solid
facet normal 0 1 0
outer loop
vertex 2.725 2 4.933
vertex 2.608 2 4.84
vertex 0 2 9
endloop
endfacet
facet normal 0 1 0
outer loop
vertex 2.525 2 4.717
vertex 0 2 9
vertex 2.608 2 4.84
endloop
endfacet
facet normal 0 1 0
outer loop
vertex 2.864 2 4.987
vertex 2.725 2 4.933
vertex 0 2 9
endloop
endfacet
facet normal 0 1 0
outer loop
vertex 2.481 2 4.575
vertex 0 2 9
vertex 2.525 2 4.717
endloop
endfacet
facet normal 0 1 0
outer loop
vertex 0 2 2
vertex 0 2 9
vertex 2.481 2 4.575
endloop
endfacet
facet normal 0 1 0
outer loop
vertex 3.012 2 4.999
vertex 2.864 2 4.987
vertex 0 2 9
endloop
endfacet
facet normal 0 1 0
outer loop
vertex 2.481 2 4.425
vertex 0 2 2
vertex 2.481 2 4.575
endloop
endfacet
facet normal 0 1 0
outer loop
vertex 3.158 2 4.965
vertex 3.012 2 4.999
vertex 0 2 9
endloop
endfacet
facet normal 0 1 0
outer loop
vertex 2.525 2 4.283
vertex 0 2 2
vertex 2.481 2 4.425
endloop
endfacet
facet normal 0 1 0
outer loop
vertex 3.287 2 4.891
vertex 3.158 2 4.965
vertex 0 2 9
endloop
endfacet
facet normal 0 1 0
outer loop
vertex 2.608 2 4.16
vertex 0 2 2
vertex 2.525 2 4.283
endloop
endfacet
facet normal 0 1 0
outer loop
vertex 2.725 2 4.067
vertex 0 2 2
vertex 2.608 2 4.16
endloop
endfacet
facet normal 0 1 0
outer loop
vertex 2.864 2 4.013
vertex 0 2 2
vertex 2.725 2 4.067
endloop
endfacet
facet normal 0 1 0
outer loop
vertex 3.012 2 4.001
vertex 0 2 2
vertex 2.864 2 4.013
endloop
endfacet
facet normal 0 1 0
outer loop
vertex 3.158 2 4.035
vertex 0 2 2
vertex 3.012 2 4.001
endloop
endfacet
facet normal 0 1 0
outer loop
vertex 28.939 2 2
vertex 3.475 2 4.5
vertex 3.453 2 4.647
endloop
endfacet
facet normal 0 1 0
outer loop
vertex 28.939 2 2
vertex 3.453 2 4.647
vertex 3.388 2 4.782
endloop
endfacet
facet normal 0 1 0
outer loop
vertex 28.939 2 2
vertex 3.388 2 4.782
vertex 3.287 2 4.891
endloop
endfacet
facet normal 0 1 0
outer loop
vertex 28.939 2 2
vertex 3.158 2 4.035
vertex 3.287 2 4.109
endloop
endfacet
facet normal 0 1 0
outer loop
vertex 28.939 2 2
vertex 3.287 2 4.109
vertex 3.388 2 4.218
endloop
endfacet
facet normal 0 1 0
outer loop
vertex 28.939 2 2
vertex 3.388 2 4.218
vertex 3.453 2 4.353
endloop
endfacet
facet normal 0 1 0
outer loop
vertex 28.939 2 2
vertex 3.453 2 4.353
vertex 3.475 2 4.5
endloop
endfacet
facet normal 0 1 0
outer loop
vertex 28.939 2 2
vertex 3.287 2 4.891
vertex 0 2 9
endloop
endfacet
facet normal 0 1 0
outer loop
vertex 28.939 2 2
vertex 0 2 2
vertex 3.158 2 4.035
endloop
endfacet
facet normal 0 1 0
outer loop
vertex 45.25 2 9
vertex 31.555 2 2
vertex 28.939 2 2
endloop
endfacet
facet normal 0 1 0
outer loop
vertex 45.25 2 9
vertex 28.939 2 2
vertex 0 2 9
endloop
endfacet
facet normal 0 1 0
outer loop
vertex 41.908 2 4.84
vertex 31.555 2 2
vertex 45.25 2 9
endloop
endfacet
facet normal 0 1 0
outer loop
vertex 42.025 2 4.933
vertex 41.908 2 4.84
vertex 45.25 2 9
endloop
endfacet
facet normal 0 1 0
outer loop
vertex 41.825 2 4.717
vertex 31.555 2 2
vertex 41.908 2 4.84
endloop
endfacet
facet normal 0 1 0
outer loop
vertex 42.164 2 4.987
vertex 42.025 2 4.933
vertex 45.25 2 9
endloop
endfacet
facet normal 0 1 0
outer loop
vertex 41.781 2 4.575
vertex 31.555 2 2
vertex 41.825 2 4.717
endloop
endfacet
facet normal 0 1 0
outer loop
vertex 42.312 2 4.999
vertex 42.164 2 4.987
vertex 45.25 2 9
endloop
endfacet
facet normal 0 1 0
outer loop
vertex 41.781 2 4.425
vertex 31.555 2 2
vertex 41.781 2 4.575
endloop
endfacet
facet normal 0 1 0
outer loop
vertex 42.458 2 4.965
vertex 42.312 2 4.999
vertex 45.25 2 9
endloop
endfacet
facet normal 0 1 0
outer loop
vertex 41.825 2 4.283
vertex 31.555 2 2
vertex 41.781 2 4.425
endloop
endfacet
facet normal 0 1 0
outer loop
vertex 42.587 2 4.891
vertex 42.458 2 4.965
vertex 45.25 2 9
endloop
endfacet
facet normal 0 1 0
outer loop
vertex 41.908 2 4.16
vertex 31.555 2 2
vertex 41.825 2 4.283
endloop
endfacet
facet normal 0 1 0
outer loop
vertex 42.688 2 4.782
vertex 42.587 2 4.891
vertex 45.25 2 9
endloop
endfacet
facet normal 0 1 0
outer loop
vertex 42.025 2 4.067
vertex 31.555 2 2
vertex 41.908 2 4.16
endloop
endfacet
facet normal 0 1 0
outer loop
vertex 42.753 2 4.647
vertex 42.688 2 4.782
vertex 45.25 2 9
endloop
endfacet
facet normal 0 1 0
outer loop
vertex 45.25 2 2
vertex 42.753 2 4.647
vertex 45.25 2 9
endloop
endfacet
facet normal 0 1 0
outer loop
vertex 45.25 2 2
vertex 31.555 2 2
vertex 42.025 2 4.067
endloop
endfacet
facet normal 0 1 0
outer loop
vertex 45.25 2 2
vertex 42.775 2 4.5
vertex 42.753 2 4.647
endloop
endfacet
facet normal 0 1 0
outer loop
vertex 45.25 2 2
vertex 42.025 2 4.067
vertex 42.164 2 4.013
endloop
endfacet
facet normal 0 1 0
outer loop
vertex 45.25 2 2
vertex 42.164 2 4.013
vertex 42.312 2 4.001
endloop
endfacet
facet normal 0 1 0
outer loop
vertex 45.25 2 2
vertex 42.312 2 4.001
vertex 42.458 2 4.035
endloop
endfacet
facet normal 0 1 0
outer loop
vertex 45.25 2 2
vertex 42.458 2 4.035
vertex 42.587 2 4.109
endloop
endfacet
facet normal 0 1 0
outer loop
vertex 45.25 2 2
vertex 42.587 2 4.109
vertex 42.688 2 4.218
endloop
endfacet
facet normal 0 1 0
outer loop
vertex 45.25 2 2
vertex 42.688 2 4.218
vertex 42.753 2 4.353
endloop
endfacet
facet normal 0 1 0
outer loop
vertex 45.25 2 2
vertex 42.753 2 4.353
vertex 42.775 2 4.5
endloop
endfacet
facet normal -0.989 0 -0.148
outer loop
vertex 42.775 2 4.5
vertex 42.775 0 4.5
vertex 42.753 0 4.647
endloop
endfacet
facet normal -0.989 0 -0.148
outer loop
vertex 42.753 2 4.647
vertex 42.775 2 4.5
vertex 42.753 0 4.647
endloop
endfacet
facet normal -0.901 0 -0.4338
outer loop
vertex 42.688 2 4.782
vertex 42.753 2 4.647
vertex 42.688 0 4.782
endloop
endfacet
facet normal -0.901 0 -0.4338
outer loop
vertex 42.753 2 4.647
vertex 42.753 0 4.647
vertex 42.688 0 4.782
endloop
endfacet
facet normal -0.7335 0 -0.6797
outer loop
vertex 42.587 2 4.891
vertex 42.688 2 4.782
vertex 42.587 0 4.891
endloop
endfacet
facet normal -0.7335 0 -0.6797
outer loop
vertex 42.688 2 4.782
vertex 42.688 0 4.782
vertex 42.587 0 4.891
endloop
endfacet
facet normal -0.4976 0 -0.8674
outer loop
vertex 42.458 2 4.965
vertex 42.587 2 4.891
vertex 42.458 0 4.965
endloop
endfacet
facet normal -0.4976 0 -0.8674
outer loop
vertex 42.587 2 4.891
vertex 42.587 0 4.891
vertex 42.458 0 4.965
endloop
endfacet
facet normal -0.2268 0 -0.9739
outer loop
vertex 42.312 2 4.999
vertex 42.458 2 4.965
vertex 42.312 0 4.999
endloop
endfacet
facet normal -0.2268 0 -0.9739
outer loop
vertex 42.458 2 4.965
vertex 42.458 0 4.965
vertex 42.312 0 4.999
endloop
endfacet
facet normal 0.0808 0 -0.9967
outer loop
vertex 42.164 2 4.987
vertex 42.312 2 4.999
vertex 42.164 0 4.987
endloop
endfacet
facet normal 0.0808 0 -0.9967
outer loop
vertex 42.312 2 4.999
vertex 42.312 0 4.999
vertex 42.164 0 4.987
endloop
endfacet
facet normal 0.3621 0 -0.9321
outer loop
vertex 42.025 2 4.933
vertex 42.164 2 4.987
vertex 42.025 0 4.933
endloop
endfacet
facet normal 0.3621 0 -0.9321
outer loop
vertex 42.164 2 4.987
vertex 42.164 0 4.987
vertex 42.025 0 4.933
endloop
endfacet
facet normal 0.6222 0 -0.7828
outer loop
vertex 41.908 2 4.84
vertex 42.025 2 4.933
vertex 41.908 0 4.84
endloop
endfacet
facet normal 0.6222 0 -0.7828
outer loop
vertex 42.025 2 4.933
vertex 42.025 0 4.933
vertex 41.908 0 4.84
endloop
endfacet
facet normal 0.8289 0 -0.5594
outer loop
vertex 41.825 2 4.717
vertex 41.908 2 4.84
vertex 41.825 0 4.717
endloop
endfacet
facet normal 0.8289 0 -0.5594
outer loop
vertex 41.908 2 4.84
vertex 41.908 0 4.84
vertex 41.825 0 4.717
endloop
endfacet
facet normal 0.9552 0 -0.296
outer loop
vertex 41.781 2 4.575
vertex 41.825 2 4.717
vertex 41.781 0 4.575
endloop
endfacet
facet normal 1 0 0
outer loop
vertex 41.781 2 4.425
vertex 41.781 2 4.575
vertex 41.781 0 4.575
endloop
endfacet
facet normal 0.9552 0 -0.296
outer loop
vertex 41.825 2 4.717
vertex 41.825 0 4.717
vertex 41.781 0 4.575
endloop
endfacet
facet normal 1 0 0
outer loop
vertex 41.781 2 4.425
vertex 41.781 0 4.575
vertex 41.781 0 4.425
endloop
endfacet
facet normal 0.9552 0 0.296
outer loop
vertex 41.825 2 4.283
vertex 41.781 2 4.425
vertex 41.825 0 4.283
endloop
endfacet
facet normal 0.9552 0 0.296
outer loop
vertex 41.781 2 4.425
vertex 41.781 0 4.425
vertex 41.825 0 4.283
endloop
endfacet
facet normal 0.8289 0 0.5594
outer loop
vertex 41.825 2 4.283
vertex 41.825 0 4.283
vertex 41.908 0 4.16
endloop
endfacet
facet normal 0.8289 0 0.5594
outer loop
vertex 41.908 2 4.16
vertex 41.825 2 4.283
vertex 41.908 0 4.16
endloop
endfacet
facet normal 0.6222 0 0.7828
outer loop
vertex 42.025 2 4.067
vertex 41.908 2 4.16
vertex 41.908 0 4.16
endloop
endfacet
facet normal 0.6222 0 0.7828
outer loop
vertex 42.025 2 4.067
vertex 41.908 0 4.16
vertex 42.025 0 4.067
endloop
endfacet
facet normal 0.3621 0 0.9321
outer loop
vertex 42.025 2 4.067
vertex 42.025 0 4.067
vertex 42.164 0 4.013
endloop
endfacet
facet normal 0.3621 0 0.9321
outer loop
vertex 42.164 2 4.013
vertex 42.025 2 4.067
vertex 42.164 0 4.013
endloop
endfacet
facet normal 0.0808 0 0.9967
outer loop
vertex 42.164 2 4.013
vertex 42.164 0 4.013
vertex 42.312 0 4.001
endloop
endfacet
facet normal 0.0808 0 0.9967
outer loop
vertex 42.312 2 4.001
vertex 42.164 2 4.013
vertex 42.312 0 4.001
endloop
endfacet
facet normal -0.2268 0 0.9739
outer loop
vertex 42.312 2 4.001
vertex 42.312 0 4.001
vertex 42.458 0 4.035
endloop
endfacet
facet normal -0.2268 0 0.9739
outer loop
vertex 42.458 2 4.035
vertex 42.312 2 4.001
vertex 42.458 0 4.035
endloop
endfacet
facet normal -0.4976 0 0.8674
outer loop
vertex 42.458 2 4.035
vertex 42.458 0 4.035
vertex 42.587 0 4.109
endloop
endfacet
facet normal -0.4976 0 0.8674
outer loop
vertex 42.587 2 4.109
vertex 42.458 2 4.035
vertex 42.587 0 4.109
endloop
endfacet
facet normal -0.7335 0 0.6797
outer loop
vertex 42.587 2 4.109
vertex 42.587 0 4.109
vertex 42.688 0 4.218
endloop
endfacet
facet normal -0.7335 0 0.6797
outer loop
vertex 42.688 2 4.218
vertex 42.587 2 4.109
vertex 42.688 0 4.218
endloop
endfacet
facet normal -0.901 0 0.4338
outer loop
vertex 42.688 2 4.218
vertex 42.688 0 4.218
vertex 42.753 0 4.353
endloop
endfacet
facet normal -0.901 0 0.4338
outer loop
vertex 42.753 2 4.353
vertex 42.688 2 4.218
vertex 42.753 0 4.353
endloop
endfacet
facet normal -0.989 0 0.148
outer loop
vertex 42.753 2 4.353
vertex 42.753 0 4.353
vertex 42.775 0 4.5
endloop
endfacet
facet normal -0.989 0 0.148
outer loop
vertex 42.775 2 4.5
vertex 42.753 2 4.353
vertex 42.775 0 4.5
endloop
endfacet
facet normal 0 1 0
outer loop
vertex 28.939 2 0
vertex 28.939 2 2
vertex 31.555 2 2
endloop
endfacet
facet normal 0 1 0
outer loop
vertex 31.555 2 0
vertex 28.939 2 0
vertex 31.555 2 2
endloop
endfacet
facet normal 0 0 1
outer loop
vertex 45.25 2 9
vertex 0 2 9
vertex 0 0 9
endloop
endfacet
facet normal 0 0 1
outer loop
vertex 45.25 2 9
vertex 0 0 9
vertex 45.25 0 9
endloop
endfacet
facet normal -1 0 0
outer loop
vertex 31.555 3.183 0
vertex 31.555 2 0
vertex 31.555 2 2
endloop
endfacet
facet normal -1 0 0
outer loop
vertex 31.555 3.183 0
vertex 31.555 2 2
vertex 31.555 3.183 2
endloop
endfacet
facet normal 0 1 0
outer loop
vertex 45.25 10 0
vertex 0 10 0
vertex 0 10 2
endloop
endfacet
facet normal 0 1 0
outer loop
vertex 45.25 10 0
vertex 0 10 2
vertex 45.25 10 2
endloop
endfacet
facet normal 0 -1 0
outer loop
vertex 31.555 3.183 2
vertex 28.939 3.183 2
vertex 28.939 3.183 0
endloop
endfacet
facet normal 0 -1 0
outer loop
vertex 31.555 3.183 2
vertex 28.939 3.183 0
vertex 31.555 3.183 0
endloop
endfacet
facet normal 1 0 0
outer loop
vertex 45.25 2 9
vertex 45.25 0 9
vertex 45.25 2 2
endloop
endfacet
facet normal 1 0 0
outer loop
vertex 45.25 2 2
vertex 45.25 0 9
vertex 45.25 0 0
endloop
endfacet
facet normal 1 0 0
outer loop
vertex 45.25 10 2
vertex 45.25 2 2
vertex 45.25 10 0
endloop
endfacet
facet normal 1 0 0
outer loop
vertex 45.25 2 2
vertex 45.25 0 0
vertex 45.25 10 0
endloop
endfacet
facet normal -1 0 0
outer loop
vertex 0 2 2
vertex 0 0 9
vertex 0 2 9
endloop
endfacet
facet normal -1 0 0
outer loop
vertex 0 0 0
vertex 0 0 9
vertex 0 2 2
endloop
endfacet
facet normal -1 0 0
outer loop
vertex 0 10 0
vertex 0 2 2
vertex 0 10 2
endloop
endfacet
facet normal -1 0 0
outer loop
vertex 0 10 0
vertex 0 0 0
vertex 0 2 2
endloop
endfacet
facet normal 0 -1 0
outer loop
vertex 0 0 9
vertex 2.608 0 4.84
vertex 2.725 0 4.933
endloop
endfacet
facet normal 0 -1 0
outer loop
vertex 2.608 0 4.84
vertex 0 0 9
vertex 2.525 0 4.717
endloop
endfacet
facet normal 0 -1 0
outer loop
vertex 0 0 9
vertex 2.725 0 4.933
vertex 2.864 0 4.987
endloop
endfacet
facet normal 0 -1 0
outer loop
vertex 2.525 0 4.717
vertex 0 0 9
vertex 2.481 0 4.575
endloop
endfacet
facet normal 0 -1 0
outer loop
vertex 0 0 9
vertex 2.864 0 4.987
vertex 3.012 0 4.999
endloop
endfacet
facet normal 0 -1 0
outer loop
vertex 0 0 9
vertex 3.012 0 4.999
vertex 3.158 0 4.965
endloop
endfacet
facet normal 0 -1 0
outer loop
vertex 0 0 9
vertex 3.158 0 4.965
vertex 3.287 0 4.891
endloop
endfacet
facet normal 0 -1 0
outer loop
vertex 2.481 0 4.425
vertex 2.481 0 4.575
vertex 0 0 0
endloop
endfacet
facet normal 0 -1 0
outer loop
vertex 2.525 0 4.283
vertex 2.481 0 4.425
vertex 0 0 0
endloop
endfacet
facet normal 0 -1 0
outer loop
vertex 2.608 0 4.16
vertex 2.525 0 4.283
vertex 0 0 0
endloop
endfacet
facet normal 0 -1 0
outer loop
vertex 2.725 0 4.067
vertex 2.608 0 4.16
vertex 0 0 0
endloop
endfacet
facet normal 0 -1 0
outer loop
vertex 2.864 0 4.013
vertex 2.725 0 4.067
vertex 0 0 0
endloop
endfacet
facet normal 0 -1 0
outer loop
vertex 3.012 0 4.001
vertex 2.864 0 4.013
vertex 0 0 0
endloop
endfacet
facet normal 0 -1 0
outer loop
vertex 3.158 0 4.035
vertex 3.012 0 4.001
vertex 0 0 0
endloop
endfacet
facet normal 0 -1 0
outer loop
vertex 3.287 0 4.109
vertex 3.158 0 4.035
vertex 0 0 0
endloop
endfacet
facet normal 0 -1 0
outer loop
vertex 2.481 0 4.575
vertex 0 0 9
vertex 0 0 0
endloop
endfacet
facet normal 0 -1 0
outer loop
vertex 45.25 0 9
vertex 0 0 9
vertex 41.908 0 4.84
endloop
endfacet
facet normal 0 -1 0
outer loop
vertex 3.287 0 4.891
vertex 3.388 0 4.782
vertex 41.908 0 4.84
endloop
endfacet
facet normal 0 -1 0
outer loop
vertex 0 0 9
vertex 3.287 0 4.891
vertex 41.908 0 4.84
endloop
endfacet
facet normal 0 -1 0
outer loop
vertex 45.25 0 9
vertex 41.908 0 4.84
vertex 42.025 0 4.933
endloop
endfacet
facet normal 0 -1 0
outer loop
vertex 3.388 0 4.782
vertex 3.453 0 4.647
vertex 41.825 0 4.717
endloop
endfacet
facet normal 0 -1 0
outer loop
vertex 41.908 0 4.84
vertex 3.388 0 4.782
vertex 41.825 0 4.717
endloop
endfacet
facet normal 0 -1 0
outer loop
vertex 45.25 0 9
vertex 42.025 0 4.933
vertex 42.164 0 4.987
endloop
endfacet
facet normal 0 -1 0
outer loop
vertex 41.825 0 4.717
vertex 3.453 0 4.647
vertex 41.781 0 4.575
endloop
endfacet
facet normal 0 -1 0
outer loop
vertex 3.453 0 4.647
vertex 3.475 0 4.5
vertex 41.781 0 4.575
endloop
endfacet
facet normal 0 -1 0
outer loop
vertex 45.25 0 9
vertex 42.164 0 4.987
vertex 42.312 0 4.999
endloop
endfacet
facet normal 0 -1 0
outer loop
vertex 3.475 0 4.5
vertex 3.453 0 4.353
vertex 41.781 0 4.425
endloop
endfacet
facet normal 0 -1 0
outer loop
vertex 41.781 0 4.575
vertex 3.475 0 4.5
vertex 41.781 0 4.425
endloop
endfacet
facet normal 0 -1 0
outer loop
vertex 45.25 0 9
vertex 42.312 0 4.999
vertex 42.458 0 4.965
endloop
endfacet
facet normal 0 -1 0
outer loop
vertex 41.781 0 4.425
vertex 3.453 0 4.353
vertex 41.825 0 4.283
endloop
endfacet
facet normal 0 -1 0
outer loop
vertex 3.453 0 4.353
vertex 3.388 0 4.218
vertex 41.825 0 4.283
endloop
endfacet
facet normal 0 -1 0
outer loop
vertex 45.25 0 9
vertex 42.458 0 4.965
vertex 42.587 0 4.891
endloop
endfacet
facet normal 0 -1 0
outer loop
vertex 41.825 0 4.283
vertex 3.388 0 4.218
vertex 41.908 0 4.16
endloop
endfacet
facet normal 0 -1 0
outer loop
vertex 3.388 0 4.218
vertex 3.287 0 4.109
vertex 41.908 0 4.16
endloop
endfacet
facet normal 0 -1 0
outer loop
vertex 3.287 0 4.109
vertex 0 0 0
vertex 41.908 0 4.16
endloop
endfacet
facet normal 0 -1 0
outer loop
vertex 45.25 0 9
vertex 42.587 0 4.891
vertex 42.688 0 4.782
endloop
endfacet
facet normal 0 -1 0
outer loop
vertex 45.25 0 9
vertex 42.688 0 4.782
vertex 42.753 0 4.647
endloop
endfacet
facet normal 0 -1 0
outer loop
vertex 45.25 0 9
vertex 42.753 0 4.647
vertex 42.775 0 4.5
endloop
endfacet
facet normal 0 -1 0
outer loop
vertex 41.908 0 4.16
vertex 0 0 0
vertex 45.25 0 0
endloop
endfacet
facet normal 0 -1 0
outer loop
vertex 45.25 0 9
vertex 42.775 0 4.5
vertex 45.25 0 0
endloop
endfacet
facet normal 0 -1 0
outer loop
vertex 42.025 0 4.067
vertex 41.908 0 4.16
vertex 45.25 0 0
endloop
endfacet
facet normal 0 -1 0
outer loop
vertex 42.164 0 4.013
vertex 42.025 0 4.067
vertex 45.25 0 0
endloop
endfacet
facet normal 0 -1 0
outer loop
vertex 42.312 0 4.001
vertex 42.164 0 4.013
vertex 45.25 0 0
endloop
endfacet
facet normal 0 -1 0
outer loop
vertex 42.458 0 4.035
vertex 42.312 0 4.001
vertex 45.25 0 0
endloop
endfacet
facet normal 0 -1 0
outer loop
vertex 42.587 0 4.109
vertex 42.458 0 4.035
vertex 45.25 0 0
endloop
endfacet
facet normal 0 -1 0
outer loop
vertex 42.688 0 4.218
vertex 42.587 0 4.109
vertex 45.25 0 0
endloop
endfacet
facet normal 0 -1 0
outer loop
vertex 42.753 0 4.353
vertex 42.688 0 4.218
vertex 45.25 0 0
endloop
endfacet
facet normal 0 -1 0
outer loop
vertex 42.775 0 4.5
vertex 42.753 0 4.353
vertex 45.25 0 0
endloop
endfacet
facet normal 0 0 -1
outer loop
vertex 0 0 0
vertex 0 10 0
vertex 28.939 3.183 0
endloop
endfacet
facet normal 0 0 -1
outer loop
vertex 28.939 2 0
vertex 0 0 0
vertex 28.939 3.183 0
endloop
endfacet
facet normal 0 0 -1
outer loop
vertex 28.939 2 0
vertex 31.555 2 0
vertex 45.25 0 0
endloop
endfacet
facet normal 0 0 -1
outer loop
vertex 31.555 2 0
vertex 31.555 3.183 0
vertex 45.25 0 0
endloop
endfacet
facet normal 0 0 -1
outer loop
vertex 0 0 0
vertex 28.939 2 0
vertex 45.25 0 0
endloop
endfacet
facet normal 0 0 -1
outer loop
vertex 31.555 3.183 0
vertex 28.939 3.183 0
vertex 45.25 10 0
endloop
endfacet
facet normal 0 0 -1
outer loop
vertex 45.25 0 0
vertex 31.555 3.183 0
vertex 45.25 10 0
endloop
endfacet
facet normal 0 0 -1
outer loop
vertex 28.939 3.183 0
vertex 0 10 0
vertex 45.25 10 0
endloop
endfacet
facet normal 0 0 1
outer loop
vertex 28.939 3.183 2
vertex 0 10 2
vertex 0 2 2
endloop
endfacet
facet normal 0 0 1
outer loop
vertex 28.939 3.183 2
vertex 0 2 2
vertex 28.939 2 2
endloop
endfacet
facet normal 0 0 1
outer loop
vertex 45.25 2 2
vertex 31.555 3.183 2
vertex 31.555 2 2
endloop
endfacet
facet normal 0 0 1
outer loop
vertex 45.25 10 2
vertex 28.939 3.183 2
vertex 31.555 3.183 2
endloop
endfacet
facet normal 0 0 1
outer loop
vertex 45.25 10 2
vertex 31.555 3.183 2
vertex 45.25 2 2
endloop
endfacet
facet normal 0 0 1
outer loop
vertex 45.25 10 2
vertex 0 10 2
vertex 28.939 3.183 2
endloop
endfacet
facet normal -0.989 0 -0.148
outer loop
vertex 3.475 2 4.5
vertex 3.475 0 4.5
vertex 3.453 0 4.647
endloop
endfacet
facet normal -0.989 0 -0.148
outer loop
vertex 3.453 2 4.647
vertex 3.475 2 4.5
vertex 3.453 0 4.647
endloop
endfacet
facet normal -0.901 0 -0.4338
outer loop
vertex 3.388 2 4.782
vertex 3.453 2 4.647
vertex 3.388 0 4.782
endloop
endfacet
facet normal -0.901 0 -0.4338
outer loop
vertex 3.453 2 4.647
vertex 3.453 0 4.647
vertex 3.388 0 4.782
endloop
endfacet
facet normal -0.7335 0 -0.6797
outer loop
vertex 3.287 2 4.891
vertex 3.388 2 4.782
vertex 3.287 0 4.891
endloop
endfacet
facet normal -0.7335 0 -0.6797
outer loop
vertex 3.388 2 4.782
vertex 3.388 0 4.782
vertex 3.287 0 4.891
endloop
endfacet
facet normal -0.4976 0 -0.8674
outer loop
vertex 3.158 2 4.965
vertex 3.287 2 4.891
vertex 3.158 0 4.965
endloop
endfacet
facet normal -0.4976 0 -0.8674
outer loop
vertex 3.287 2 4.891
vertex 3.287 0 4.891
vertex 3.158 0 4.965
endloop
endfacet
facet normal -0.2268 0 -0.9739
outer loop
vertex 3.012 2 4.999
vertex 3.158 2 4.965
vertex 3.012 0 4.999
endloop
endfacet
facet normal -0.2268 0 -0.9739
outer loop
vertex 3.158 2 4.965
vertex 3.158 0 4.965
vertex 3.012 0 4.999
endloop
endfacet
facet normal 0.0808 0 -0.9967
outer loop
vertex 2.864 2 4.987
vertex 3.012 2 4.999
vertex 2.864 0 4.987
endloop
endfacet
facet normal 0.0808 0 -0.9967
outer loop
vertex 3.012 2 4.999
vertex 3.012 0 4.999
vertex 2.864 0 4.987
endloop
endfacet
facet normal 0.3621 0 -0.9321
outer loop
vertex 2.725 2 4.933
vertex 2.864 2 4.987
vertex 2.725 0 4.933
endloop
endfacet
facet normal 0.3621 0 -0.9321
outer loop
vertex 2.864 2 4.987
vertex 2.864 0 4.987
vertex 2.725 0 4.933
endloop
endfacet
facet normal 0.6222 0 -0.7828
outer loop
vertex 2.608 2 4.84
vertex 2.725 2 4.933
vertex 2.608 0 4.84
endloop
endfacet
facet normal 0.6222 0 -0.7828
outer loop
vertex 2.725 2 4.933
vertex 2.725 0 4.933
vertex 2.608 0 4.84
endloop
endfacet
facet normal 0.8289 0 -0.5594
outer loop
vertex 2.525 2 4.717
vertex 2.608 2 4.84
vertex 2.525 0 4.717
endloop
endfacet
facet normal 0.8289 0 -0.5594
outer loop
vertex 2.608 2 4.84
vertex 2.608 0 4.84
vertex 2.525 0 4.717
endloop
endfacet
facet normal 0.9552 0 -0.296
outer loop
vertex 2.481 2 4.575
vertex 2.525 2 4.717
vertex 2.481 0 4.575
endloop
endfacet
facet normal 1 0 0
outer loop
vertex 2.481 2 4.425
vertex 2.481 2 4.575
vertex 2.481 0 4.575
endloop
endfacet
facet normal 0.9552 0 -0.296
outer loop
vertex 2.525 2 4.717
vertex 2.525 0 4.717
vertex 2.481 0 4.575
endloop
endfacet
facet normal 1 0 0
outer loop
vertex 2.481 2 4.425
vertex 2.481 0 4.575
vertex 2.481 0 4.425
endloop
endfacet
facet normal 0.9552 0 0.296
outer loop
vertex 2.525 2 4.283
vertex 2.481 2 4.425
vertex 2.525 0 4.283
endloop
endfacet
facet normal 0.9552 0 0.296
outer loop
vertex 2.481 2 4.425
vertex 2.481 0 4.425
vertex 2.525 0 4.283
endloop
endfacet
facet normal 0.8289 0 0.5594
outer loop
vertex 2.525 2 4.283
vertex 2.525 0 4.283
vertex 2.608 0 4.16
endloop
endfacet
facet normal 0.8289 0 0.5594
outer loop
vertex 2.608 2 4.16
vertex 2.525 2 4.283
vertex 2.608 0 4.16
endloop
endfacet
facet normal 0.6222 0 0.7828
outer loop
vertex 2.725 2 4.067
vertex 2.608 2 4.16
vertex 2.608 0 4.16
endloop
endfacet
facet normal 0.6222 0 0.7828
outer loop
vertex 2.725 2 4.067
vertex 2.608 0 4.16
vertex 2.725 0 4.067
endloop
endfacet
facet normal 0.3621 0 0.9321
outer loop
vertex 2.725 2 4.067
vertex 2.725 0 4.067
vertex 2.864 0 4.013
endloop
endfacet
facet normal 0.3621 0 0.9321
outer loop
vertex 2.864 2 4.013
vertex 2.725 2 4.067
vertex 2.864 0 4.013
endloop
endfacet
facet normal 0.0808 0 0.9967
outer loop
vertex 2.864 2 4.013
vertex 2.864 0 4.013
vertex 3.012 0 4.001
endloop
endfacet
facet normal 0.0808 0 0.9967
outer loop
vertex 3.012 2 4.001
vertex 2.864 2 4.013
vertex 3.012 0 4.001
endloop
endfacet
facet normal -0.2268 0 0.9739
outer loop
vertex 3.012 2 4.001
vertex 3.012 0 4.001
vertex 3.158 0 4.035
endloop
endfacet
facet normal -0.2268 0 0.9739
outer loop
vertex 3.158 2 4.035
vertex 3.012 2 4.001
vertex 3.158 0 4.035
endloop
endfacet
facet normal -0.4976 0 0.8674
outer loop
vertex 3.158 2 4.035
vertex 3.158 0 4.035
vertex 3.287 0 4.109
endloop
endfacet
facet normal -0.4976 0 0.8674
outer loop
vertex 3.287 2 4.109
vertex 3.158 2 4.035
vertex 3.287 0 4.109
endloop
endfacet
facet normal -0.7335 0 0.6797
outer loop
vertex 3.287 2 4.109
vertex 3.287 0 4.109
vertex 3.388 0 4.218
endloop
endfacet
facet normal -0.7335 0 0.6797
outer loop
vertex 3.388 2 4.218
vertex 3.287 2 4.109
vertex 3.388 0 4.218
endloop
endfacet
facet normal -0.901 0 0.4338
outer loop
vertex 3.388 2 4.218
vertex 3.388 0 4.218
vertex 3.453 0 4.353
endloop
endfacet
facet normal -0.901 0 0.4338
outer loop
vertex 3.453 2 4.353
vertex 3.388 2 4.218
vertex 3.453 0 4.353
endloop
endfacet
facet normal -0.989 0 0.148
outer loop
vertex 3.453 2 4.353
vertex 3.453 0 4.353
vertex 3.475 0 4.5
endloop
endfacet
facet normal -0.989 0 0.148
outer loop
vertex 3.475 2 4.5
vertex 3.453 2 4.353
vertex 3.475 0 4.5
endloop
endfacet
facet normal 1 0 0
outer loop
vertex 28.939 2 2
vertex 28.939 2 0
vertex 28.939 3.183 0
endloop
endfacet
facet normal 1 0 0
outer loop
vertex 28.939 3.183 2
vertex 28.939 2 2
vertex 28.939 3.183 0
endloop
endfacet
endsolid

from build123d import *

# Parameters (mm, degrees)
F0_W     = 45.25
F0_H     = 10
F1_DEPTH = 2
F2_W     = 45.25
F2_H     = 2
F3_DEPTH = 7
F4_R     = 0.5
F5_DEPTH = 25
F6_DEPTH = 25
F7_W     = 2.616208
F7_H     = 1.183311
F8_DEPTH = 3


with BuildPart() as f1:
    # F0 (on Top) → F1 (new body)
    with BuildSketch(Plane.XY):
        with Locations((22.625, 5)):
            Rectangle(F0_W, F0_H)
    extrude(amount=F1_DEPTH)

    # F2 (on face) → F3 (join)
    with BuildSketch(Plane.XY.offset(2)):
        with Locations((22.625, 1)):
            Rectangle(F2_W, F2_H)
    extrude(amount=F3_DEPTH)

    # F4 (on face) → F5 (cut)
    with BuildSketch(Plane.XZ):
        with Locations((2.975, 4.5)):
            Circle(F4_R)
    extrude(amount=-F5_DEPTH, mode=Mode.SUBTRACT)

    # F4 (on face) → F6 (cut)
    with BuildSketch(Plane.XZ):
        with Locations((42.275, 4.5)):
            Circle(F4_R)
    extrude(amount=-F6_DEPTH, mode=Mode.SUBTRACT)

    # F7 (on face) → F8 (cut)
    with BuildSketch(Plane.XY.offset(2)):
        with Locations((30.246938, 2.591655)):
            Rectangle(F7_W, F7_H)
    extrude(amount=-F8_DEPTH, mode=Mode.SUBTRACT)


solid = f1.part
